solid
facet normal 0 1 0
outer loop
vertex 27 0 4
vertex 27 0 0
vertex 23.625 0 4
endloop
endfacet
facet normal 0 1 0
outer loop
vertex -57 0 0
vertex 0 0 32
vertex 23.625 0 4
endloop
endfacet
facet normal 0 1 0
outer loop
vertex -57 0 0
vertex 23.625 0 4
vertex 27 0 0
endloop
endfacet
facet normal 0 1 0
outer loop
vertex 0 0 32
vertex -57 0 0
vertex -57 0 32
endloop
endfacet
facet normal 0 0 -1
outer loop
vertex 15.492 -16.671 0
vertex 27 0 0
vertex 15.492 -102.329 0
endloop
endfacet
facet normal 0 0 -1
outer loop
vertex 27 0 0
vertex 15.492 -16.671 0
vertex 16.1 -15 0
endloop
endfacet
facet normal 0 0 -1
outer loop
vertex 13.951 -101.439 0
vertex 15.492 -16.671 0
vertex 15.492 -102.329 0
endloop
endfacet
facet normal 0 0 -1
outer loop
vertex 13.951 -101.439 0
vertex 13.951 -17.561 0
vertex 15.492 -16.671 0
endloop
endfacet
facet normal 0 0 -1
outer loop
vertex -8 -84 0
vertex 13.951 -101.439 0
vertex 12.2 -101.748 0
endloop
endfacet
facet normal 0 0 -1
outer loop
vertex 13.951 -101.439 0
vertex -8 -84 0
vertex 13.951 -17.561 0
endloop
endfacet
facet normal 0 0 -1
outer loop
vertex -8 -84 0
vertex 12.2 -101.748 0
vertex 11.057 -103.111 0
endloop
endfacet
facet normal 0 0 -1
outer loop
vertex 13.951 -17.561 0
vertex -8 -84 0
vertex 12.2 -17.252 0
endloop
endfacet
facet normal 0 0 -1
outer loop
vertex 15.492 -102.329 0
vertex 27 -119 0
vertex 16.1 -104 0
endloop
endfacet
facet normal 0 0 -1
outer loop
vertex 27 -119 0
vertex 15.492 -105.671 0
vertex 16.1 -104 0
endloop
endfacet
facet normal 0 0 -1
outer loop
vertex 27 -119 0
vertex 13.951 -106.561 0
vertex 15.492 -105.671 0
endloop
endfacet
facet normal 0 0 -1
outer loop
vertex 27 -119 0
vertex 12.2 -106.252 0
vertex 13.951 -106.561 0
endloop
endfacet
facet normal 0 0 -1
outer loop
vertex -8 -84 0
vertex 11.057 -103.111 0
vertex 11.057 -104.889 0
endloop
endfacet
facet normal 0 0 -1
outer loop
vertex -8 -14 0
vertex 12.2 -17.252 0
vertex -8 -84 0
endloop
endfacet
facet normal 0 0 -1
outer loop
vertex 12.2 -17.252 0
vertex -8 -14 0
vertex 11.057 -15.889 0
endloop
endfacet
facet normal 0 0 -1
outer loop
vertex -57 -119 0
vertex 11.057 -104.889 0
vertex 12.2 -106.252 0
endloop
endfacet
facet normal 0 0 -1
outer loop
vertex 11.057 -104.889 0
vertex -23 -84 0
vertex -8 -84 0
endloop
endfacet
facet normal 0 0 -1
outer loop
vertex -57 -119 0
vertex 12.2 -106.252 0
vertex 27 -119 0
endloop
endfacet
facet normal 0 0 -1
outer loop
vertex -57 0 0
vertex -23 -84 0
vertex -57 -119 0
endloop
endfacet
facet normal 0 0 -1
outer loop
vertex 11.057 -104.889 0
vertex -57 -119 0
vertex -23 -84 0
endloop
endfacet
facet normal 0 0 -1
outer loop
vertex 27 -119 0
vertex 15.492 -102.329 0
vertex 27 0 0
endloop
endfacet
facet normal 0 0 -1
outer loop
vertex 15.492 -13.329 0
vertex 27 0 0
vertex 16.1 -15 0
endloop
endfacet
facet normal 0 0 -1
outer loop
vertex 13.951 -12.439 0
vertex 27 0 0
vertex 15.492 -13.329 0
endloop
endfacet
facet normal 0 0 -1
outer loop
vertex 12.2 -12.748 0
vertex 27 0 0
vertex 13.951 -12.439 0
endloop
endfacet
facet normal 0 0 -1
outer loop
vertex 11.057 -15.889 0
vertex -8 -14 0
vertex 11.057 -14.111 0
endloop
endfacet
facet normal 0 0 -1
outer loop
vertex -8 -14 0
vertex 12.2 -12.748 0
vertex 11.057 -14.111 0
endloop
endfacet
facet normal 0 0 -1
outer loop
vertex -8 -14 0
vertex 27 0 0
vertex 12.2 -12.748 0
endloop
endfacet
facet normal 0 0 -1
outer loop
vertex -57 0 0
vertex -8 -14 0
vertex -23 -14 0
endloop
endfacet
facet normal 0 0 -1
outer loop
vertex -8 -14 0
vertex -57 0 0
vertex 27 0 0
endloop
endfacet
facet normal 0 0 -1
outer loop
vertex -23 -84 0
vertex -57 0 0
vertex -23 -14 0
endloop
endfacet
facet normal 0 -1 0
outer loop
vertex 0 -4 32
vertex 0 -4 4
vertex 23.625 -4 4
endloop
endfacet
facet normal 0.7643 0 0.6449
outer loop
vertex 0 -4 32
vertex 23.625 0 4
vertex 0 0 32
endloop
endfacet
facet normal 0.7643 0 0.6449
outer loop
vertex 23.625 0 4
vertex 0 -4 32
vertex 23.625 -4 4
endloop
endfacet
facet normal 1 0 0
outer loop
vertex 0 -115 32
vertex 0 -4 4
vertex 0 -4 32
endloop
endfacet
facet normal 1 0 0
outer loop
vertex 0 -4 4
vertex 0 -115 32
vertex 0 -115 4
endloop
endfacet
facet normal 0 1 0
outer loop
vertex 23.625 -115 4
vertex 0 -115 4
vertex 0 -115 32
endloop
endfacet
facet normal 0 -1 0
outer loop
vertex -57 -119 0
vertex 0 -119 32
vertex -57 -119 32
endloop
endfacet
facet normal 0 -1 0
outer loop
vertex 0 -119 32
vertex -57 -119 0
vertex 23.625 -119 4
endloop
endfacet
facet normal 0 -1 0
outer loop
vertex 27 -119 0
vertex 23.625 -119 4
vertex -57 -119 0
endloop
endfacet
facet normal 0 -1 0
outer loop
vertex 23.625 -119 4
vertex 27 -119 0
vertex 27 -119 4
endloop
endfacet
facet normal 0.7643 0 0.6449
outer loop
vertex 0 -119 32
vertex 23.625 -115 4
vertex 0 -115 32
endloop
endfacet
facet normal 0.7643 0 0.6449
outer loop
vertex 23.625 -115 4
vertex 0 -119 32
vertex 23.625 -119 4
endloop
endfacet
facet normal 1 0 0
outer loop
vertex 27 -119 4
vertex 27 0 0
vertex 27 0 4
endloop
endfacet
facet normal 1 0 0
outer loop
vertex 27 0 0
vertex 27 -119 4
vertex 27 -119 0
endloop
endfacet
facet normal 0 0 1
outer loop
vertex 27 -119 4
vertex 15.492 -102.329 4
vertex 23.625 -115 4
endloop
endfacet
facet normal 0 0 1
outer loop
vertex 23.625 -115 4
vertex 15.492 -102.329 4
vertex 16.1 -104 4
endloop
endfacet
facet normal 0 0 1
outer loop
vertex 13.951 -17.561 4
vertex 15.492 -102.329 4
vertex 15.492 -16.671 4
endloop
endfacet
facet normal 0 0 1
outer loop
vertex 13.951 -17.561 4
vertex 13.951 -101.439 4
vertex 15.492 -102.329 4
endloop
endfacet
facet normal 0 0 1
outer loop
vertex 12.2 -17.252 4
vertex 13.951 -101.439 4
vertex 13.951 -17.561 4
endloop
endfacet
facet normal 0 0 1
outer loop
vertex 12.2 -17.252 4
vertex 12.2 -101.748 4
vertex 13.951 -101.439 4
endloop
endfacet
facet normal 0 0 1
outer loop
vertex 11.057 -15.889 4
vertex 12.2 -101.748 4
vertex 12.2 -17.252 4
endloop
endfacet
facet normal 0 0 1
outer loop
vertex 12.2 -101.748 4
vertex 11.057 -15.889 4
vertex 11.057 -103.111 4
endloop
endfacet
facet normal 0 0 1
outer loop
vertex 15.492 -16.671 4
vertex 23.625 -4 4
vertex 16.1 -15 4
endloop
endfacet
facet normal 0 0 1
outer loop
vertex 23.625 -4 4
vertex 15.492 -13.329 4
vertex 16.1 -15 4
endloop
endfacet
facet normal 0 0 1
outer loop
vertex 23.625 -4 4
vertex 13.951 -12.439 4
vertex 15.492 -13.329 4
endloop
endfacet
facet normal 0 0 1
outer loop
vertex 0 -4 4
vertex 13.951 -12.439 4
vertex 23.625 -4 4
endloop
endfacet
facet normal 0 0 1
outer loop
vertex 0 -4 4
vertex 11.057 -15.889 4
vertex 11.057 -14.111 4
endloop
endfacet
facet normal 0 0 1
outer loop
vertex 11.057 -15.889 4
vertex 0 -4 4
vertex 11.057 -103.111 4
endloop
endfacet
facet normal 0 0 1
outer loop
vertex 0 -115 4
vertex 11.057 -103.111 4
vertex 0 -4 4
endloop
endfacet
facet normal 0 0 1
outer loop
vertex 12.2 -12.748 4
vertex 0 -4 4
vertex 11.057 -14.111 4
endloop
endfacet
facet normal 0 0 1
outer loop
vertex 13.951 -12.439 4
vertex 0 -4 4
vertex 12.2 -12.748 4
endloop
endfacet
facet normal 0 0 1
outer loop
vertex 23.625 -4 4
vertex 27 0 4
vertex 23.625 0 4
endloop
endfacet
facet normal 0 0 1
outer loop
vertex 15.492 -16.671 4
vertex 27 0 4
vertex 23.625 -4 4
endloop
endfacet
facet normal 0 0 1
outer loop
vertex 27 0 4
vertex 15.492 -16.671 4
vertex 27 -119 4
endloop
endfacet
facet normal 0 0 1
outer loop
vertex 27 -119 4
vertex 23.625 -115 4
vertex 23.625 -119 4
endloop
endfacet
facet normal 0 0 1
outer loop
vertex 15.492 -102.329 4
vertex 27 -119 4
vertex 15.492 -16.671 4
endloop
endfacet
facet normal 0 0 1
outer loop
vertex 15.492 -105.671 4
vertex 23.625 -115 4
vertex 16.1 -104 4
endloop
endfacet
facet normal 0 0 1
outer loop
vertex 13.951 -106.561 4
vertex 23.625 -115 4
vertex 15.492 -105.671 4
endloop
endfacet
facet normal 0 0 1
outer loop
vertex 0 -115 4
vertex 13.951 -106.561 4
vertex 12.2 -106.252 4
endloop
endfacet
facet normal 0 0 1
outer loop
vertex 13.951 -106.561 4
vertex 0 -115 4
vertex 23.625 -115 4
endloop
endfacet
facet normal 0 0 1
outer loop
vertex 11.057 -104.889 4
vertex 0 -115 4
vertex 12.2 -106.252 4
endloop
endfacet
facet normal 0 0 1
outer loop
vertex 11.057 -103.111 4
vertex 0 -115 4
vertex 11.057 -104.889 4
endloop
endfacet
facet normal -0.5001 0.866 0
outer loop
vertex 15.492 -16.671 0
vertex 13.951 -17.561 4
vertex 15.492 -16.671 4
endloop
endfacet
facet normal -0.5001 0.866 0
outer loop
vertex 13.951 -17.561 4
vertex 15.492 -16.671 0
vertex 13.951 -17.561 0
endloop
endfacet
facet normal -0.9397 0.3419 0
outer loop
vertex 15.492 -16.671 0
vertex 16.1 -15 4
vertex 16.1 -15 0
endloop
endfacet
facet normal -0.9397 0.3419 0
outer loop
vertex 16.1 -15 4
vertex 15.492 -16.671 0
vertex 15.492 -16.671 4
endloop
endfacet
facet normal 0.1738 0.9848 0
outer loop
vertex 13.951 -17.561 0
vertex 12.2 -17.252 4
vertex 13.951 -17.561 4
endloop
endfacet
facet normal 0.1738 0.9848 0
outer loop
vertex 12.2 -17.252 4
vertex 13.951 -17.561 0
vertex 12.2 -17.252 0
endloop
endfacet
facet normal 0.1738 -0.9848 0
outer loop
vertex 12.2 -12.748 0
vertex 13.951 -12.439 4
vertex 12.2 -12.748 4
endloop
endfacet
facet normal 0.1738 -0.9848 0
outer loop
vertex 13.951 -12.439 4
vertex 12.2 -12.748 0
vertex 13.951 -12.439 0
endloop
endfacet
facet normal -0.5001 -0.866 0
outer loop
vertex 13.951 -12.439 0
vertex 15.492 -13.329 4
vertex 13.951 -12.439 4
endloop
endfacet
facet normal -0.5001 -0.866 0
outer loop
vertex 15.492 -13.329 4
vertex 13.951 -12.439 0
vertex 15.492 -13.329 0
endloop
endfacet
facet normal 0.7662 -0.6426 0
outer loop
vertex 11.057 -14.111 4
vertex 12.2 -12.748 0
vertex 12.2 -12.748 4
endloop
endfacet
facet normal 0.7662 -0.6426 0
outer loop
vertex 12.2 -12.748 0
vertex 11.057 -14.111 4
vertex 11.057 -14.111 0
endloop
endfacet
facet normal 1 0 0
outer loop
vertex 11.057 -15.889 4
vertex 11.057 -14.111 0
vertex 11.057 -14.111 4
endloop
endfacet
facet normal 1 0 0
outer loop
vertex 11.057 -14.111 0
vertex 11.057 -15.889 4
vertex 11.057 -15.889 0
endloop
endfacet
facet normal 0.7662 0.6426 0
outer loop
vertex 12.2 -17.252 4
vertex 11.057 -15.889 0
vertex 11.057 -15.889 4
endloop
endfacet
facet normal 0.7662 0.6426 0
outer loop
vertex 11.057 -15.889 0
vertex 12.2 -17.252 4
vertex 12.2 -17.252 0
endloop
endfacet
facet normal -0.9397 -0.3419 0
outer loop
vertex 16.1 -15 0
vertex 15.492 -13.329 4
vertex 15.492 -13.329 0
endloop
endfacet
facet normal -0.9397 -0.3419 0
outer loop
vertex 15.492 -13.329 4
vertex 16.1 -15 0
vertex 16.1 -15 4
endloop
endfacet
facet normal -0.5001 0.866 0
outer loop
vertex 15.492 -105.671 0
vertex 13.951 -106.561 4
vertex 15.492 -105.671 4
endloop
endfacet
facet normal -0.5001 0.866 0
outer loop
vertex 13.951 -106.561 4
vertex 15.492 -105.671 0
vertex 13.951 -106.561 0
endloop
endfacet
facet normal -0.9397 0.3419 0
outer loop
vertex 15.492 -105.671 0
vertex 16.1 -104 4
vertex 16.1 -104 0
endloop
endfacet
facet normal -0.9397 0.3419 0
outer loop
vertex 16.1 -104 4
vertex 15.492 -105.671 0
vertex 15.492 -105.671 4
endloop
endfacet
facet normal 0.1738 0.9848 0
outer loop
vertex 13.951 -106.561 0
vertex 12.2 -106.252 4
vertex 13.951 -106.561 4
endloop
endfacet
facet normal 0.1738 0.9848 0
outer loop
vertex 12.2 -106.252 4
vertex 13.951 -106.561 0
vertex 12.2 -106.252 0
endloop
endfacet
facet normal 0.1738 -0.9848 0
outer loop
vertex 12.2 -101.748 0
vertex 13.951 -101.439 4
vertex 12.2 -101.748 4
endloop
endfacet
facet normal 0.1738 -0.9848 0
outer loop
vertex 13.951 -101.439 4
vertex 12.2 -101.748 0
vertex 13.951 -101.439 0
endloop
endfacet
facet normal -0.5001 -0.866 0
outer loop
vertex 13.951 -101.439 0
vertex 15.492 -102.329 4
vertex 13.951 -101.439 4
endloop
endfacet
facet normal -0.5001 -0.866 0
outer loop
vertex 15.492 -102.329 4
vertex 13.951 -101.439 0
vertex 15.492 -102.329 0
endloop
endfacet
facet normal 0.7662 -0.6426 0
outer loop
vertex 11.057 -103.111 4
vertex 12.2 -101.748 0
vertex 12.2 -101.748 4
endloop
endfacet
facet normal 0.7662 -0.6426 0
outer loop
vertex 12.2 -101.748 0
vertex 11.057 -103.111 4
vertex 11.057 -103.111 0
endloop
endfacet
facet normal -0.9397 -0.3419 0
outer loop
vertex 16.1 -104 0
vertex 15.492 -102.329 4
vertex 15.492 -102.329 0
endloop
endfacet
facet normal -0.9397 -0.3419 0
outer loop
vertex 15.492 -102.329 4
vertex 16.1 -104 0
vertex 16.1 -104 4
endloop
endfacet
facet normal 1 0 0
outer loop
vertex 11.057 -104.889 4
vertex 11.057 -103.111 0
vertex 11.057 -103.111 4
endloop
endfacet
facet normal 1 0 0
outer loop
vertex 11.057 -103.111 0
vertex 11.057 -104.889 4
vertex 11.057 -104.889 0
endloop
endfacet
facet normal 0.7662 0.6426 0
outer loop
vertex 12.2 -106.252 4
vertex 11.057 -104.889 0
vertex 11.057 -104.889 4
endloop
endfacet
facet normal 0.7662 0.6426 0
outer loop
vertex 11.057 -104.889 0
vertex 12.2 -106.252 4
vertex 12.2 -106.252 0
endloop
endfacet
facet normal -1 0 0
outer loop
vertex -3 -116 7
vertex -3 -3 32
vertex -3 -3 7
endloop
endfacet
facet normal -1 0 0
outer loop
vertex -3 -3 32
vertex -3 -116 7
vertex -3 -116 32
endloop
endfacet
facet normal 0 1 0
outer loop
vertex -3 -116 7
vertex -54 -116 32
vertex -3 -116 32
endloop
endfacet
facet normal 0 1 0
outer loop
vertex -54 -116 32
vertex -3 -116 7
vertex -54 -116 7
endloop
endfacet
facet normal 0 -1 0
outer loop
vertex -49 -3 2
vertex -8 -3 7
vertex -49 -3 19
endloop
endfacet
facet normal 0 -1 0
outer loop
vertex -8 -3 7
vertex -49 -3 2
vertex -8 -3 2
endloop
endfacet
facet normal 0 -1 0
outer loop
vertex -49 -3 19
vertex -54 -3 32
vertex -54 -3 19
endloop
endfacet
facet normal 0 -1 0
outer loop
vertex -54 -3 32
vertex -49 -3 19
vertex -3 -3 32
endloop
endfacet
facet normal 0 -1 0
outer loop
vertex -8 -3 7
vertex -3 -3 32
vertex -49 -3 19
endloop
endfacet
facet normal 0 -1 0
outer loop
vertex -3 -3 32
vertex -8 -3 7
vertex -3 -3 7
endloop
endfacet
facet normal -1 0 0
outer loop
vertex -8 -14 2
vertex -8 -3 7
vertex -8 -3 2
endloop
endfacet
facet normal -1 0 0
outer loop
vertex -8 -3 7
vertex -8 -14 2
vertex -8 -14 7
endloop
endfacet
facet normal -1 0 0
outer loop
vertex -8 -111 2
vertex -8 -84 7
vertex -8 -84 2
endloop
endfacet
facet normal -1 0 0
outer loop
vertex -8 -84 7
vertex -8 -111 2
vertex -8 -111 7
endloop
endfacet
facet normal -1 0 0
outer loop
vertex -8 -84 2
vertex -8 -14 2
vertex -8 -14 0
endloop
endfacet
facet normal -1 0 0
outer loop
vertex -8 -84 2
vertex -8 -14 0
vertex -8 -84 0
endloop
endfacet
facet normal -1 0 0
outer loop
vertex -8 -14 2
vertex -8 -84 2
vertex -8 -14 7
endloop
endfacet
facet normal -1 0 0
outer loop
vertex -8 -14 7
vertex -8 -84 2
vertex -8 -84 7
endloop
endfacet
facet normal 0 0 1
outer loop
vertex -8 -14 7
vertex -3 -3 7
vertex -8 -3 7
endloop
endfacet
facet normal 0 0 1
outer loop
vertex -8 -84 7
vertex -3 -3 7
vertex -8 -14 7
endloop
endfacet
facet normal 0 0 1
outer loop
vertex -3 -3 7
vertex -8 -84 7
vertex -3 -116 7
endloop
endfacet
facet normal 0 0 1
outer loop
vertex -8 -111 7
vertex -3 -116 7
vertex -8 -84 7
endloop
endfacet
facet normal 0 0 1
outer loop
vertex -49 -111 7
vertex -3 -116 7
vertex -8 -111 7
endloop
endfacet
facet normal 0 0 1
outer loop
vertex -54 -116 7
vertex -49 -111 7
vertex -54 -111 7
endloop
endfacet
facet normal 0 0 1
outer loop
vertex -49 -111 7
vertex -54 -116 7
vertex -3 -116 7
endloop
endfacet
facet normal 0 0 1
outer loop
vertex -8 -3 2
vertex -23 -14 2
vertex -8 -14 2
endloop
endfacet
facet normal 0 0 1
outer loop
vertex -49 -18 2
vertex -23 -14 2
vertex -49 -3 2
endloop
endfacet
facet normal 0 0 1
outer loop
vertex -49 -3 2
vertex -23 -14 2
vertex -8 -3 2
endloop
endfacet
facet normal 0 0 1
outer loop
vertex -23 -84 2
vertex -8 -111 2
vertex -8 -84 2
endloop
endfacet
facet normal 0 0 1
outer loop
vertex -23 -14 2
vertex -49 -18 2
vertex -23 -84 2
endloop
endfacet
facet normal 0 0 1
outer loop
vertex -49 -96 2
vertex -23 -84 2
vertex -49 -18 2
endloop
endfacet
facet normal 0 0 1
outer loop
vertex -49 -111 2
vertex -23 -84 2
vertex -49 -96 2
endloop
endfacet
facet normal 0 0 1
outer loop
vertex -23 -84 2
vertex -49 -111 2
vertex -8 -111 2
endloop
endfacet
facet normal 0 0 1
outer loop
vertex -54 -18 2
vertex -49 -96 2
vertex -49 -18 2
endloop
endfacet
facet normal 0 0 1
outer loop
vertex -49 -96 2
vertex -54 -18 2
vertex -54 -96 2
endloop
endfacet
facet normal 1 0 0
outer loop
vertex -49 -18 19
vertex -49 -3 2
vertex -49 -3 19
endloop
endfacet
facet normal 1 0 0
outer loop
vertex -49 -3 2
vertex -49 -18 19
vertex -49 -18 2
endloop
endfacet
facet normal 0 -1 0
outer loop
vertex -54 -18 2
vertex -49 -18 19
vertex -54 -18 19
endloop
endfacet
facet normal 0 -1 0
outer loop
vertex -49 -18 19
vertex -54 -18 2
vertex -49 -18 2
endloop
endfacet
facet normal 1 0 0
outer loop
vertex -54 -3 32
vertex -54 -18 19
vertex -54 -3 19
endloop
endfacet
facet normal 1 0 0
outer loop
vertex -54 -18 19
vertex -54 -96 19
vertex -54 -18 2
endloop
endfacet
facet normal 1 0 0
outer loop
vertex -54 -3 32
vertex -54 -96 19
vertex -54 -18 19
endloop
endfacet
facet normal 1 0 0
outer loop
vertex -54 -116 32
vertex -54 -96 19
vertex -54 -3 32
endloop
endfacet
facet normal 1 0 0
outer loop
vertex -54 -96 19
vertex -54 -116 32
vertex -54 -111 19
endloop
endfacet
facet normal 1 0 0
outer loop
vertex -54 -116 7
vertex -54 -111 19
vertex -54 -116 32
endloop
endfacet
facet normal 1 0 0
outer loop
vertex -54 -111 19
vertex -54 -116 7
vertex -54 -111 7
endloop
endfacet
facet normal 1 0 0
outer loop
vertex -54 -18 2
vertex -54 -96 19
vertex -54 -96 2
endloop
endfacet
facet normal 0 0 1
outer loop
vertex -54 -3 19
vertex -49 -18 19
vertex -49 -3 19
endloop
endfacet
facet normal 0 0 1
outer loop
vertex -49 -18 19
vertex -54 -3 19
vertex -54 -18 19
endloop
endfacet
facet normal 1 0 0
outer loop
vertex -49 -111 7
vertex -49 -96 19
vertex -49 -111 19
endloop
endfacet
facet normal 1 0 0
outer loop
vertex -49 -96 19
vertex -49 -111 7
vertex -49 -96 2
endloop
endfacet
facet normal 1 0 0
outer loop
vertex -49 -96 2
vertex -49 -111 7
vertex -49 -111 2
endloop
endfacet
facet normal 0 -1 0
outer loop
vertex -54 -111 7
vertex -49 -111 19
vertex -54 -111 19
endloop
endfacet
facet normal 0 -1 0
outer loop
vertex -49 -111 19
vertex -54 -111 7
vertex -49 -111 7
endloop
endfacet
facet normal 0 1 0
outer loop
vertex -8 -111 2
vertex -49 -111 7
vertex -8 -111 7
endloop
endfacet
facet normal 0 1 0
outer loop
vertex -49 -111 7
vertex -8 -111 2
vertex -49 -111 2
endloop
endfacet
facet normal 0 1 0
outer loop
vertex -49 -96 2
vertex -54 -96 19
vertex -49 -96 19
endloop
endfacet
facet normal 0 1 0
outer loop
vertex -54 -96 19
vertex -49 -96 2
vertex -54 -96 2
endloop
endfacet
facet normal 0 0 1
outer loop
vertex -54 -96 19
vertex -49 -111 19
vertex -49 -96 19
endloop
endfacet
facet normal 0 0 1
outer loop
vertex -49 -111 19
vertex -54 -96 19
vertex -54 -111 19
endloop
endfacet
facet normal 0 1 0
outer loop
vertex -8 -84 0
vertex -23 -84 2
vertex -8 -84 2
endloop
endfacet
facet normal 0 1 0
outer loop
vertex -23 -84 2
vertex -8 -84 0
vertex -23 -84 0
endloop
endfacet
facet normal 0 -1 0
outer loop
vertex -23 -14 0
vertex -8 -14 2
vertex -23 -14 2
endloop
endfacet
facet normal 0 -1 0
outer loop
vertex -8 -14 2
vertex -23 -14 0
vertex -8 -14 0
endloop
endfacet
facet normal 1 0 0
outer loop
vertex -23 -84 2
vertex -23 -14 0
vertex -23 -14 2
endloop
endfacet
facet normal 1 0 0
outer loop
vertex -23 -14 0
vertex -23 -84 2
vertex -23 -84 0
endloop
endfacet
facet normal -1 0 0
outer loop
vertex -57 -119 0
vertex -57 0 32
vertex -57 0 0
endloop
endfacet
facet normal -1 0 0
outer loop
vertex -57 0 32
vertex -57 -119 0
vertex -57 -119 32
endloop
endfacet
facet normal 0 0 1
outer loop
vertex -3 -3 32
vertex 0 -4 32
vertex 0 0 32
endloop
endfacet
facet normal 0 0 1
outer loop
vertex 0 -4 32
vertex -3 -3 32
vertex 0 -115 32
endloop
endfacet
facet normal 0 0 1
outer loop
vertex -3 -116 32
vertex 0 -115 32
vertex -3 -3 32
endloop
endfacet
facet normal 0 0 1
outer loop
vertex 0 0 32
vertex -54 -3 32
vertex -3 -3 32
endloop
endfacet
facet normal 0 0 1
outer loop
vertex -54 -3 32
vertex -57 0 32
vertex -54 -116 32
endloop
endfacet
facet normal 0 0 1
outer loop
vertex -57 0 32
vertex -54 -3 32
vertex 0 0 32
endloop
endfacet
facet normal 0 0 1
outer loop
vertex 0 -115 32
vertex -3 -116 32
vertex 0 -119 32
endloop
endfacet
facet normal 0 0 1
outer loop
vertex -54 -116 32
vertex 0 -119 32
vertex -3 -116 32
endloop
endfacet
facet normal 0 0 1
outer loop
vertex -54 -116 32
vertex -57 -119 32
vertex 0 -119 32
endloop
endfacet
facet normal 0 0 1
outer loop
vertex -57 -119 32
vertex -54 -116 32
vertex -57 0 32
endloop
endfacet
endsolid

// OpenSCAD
psu_width = 113;
psu_height = 51;

terminal_length = 70;
terminal_width = 12;
terminal_height = 15;
bracket_height = 30;
floor_thickness = 2;
wall_thickness = 3;
back_thickness = 3;
brace_thickness = 4;
profile_thickness = 27;
bolt = 5.2;



rotate([90,0,0])
    union(){
        //the brace pieces
        for (i = [0:(psu_width+(wall_thickness*2))-brace_thickness:(psu_width+(wall_thickness*2))-brace_thickness]){
            translate([0,0,i])
                linear_extrude(brace_thickness)
                    polygon(
                        points = [[0,0],[0,bracket_height+floor_thickness],[profile_thickness,0]]);
        }
        //holes for mounting to frame
        difference(){
            cube([profile_thickness,brace_thickness,psu_width+(wall_thickness*2)]);
            translate([profile_thickness/2,brace_thickness/2,15])rotate([90,0])cylinder(d=bolt,h=brace_thickness+2,center=true);
            translate([profile_thickness/2,brace_thickness/2,(psu_width+(wall_thickness*2))-15])rotate([90,0])cylinder(d=bolt,h=brace_thickness+2,center=true);
        }
        //the box holder for the psu
        difference(){
            //outer casing
            translate([-psu_height-wall_thickness-back_thickness,0,0])cube([psu_height+wall_thickness+back_thickness,bracket_height+floor_thickness,psu_width+(wall_thickness*2)]);
            union(){//the cutouts
            //translate([-psu_height-back_thickness,floor_thickness,wall_thickness])cube([psu_height,bracket_height+0.1,psu_width]);
            difference(){
                translate([-psu_height-back_thickness,floor_thickness,wall_thickness])cube([psu_height,bracket_height+0.1,psu_width]);
                union(){        
                    translate([-5-back_thickness,floor_thickness,wall_thickness])cube([5,5,psu_width]);
                    translate([-psu_height-back_thickness,floor_thickness,wall_thickness])cube([5,12+5,15]);
                    translate([-psu_height-back_thickness,floor_thickness,psu_width+wall_thickness-20])cube([5,12+5,15]);
                    translate([-psu_height-back_thickness,floor_thickness,psu_width+wall_thickness-5])cube([psu_height,5,5]);
                }
            }
            translate([-terminal_height-back_thickness-5,-terminal_width,wall_thickness+11])cube([terminal_height,bracket_height+0.1,terminal_length]);
            }
        }
    }
/**/
